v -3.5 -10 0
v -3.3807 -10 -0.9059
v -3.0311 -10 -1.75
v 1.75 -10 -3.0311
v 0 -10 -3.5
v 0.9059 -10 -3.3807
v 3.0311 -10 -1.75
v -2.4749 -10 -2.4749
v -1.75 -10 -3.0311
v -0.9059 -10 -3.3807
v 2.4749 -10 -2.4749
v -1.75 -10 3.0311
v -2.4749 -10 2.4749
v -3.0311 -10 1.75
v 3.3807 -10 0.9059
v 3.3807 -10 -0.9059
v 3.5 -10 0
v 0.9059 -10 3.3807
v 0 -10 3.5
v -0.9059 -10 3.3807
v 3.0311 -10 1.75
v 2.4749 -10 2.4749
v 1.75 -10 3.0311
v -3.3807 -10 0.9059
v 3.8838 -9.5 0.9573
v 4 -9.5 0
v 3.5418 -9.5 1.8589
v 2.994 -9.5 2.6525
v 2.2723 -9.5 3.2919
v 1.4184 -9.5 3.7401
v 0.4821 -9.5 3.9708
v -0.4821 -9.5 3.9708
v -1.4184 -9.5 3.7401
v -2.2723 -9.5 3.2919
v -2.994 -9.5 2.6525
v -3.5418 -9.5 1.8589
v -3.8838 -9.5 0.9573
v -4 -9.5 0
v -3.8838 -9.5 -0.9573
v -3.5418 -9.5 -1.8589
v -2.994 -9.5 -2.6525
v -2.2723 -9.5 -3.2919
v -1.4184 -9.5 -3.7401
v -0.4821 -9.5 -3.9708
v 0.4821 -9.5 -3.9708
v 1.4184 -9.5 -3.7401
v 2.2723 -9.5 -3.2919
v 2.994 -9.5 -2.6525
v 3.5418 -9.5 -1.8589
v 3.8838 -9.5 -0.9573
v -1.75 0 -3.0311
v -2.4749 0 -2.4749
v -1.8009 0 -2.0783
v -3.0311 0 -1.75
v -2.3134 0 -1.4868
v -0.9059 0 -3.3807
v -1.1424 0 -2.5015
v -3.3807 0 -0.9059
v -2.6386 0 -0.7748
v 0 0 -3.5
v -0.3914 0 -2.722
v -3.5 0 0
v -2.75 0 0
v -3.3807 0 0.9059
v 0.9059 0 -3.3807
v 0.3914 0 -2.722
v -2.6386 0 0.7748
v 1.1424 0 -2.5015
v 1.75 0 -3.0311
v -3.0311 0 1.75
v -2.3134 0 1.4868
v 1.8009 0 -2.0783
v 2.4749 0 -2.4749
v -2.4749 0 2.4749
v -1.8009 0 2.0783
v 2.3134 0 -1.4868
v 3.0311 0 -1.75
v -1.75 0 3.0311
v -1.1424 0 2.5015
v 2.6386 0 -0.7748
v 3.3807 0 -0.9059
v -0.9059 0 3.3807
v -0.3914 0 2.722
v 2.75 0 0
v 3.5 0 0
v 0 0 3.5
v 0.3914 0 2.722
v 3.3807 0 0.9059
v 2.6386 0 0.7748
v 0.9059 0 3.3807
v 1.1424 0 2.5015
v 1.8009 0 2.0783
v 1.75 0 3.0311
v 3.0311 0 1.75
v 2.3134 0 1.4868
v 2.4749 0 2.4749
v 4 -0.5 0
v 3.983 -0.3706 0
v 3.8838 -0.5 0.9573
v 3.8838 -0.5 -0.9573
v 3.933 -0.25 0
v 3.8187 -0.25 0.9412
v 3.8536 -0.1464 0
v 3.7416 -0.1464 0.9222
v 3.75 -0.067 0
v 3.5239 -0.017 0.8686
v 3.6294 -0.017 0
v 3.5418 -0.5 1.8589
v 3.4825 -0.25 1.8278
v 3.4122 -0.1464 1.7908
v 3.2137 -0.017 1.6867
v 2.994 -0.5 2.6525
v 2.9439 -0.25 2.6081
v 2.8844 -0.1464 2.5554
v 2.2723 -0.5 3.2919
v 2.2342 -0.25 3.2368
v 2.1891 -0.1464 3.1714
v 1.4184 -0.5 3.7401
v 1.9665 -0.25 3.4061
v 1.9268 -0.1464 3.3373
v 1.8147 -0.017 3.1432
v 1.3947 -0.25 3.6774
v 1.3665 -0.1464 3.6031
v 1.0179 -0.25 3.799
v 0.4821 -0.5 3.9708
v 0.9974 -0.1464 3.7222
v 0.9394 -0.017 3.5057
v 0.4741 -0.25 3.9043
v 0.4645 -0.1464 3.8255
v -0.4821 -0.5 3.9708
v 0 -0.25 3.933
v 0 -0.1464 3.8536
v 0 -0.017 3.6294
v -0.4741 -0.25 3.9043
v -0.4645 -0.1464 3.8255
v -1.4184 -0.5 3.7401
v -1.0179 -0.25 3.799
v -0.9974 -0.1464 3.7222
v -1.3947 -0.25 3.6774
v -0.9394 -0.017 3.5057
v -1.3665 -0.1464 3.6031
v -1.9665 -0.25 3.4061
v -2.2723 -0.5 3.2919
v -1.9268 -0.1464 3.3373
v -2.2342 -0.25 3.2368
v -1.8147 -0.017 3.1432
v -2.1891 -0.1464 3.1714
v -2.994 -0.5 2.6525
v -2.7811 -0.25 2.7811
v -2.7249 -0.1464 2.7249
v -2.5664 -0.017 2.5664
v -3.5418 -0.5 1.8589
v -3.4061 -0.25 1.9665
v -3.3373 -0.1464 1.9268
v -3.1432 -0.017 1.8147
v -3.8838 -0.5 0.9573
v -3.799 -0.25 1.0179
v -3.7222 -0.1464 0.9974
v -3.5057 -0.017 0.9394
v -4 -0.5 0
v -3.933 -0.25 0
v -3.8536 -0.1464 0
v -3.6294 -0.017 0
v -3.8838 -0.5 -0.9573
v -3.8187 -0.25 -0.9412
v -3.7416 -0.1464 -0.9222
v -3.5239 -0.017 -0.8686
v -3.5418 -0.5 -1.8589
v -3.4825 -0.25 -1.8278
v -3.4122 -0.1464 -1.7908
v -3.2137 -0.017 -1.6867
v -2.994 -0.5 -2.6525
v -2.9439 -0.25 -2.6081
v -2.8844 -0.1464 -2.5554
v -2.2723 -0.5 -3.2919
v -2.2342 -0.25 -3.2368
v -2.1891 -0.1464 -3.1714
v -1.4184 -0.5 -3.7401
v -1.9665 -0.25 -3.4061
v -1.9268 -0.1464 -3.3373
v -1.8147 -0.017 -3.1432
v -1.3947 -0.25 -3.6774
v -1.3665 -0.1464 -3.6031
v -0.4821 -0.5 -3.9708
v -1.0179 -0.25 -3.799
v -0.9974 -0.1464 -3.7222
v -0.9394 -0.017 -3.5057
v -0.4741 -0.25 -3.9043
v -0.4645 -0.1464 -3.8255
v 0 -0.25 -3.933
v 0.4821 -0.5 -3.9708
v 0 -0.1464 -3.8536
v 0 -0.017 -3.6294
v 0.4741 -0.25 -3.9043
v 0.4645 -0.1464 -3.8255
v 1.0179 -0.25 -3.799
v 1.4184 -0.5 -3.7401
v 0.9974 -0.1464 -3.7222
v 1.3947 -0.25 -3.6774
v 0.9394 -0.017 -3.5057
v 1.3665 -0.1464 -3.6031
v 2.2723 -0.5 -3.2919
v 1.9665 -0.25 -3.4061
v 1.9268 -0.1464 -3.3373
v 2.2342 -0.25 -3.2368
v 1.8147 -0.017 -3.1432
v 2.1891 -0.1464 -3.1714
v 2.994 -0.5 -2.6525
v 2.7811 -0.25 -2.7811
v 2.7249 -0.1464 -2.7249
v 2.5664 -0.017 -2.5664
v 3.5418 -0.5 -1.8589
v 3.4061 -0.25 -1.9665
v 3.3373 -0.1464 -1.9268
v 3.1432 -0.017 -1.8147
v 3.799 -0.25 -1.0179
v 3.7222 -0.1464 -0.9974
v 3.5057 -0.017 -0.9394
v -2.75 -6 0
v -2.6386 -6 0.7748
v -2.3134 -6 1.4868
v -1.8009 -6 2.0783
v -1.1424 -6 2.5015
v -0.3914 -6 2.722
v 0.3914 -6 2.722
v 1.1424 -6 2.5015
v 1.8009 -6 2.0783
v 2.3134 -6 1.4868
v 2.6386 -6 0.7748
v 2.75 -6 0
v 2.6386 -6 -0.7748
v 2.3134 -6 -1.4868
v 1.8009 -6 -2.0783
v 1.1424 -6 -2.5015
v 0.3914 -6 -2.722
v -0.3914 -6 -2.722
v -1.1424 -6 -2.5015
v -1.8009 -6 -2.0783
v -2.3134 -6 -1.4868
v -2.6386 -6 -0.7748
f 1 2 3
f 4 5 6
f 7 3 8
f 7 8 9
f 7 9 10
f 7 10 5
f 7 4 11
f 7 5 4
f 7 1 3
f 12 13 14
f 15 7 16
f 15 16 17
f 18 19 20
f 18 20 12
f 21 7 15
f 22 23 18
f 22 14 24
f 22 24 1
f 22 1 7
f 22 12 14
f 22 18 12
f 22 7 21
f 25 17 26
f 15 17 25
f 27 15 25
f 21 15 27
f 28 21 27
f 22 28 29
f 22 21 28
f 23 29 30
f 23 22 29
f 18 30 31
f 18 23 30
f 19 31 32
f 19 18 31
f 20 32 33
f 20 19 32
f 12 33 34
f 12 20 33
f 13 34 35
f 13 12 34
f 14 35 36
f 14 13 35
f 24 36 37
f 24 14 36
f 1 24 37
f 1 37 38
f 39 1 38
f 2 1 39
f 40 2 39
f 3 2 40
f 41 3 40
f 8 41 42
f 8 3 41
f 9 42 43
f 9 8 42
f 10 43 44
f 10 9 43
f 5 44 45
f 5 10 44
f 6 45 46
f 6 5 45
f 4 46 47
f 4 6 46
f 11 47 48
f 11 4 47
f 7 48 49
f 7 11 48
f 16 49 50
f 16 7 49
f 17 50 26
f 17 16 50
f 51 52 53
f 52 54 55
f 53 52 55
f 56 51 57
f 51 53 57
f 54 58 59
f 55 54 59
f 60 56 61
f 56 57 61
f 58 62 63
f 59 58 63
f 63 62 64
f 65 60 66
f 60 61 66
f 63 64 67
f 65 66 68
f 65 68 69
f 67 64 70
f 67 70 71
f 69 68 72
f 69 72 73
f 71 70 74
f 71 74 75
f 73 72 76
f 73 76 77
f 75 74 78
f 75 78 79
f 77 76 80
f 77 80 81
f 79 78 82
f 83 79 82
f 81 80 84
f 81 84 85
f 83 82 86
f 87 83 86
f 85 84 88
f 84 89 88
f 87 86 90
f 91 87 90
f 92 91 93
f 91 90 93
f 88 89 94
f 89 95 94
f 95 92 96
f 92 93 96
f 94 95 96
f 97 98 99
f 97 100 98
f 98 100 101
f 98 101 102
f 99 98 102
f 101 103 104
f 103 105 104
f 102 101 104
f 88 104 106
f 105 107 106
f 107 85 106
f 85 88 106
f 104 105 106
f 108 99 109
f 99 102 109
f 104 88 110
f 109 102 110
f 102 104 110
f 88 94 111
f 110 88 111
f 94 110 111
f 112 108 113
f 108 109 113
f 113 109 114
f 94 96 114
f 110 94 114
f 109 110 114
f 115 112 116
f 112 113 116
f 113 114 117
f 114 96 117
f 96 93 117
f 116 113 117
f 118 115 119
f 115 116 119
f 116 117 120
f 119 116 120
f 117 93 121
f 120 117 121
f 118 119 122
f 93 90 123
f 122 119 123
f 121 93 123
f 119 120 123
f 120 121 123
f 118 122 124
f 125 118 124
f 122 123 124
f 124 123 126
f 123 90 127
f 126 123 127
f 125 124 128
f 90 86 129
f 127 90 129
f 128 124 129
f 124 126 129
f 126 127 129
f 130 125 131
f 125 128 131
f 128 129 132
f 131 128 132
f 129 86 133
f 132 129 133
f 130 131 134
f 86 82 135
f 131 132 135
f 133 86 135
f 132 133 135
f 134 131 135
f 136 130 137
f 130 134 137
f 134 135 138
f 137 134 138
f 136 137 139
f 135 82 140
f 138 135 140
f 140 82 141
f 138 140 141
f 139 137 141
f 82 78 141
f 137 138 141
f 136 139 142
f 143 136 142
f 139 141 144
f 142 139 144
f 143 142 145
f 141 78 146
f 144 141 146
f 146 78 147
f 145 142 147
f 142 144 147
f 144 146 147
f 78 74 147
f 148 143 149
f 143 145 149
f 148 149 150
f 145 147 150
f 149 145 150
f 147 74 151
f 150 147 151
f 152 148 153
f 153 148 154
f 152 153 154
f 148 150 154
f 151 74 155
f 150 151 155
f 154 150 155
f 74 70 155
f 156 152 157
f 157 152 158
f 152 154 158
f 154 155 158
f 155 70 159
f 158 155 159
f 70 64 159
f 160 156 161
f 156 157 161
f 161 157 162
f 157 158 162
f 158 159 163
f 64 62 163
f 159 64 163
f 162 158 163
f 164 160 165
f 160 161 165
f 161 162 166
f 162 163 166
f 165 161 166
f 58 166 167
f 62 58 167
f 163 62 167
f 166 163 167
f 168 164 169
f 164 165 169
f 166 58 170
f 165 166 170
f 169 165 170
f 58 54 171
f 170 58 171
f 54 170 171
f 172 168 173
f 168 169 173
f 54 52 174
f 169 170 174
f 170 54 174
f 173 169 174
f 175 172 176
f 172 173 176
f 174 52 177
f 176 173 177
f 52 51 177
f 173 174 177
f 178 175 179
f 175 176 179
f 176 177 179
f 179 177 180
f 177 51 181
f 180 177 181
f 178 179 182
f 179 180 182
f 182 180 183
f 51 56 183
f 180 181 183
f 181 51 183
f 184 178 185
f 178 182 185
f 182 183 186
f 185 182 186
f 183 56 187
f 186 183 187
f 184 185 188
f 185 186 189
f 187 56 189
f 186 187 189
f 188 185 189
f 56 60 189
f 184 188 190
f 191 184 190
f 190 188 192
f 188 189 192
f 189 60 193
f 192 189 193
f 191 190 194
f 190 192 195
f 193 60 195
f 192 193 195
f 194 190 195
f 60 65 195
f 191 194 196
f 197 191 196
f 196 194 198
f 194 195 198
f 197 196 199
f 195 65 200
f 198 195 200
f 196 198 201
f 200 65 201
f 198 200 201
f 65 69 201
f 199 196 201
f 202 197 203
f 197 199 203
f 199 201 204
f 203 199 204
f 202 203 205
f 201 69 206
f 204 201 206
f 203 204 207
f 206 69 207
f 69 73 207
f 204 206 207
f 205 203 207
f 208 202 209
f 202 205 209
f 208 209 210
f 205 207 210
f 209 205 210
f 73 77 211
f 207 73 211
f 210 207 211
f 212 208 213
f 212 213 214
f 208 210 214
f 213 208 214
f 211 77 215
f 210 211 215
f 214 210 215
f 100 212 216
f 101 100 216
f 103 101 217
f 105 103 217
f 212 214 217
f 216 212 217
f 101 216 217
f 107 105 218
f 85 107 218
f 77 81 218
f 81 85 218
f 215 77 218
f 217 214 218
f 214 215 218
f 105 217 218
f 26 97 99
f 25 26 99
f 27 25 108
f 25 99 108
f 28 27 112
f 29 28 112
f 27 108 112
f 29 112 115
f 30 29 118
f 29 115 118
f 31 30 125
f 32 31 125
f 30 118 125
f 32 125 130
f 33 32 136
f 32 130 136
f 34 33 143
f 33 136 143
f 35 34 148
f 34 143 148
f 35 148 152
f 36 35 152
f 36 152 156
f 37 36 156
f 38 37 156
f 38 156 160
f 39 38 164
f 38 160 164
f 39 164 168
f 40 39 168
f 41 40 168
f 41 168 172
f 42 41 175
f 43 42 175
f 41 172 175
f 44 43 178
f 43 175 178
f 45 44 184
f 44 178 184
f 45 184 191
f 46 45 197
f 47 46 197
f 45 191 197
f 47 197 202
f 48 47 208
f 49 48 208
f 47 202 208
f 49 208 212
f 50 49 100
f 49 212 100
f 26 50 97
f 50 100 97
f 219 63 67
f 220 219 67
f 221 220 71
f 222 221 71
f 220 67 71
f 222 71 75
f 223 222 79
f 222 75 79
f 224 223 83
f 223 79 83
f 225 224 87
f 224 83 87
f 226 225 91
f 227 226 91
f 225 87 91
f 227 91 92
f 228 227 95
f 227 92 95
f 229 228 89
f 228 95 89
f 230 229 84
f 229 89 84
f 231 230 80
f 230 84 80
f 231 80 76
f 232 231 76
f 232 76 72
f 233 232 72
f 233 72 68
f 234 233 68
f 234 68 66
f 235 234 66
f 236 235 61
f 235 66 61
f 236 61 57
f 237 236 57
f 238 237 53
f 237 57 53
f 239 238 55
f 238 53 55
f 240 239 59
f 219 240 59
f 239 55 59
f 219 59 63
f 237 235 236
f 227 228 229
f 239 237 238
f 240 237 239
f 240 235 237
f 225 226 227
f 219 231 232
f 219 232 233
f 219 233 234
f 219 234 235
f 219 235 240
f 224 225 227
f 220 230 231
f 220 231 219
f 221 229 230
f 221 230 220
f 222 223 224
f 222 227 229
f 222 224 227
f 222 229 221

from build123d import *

# Parameters (mm, degrees)
F0_R     = 4
F1_DEPTH = 10
F2_SIZE  = 0.5
F3_R     = 2.75
F4_DEPTH = 6
F5_R     = 0.5


with BuildPart() as f1:
    # F0 (on Front) → F1 (new body)
    with BuildSketch(Plane.XZ):
        Circle(F0_R)
    extrude(amount=F1_DEPTH)

    # F2
    f2_edges = [f1.edges().sort_by_distance(p)[0] for p in [
        (-4, -10, 0),
    ]]
    chamfer(f2_edges, length=F2_SIZE)

    # F3 (on face) → F4 (cut)
    with BuildSketch(Plane(origin=(0, 0, 0), x_dir=(-1, 0, 0), z_dir=(0, 1, 0))):
        Circle(F3_R)
    extrude(amount=-F4_DEPTH, mode=Mode.SUBTRACT)

    # F5
    f5_edges = [f1.edges().sort_by_distance(p)[0] for p in [
        (-4, 0, 0),
    ]]
    fillet(f5_edges, radius=F5_R)


solid = f1.part
